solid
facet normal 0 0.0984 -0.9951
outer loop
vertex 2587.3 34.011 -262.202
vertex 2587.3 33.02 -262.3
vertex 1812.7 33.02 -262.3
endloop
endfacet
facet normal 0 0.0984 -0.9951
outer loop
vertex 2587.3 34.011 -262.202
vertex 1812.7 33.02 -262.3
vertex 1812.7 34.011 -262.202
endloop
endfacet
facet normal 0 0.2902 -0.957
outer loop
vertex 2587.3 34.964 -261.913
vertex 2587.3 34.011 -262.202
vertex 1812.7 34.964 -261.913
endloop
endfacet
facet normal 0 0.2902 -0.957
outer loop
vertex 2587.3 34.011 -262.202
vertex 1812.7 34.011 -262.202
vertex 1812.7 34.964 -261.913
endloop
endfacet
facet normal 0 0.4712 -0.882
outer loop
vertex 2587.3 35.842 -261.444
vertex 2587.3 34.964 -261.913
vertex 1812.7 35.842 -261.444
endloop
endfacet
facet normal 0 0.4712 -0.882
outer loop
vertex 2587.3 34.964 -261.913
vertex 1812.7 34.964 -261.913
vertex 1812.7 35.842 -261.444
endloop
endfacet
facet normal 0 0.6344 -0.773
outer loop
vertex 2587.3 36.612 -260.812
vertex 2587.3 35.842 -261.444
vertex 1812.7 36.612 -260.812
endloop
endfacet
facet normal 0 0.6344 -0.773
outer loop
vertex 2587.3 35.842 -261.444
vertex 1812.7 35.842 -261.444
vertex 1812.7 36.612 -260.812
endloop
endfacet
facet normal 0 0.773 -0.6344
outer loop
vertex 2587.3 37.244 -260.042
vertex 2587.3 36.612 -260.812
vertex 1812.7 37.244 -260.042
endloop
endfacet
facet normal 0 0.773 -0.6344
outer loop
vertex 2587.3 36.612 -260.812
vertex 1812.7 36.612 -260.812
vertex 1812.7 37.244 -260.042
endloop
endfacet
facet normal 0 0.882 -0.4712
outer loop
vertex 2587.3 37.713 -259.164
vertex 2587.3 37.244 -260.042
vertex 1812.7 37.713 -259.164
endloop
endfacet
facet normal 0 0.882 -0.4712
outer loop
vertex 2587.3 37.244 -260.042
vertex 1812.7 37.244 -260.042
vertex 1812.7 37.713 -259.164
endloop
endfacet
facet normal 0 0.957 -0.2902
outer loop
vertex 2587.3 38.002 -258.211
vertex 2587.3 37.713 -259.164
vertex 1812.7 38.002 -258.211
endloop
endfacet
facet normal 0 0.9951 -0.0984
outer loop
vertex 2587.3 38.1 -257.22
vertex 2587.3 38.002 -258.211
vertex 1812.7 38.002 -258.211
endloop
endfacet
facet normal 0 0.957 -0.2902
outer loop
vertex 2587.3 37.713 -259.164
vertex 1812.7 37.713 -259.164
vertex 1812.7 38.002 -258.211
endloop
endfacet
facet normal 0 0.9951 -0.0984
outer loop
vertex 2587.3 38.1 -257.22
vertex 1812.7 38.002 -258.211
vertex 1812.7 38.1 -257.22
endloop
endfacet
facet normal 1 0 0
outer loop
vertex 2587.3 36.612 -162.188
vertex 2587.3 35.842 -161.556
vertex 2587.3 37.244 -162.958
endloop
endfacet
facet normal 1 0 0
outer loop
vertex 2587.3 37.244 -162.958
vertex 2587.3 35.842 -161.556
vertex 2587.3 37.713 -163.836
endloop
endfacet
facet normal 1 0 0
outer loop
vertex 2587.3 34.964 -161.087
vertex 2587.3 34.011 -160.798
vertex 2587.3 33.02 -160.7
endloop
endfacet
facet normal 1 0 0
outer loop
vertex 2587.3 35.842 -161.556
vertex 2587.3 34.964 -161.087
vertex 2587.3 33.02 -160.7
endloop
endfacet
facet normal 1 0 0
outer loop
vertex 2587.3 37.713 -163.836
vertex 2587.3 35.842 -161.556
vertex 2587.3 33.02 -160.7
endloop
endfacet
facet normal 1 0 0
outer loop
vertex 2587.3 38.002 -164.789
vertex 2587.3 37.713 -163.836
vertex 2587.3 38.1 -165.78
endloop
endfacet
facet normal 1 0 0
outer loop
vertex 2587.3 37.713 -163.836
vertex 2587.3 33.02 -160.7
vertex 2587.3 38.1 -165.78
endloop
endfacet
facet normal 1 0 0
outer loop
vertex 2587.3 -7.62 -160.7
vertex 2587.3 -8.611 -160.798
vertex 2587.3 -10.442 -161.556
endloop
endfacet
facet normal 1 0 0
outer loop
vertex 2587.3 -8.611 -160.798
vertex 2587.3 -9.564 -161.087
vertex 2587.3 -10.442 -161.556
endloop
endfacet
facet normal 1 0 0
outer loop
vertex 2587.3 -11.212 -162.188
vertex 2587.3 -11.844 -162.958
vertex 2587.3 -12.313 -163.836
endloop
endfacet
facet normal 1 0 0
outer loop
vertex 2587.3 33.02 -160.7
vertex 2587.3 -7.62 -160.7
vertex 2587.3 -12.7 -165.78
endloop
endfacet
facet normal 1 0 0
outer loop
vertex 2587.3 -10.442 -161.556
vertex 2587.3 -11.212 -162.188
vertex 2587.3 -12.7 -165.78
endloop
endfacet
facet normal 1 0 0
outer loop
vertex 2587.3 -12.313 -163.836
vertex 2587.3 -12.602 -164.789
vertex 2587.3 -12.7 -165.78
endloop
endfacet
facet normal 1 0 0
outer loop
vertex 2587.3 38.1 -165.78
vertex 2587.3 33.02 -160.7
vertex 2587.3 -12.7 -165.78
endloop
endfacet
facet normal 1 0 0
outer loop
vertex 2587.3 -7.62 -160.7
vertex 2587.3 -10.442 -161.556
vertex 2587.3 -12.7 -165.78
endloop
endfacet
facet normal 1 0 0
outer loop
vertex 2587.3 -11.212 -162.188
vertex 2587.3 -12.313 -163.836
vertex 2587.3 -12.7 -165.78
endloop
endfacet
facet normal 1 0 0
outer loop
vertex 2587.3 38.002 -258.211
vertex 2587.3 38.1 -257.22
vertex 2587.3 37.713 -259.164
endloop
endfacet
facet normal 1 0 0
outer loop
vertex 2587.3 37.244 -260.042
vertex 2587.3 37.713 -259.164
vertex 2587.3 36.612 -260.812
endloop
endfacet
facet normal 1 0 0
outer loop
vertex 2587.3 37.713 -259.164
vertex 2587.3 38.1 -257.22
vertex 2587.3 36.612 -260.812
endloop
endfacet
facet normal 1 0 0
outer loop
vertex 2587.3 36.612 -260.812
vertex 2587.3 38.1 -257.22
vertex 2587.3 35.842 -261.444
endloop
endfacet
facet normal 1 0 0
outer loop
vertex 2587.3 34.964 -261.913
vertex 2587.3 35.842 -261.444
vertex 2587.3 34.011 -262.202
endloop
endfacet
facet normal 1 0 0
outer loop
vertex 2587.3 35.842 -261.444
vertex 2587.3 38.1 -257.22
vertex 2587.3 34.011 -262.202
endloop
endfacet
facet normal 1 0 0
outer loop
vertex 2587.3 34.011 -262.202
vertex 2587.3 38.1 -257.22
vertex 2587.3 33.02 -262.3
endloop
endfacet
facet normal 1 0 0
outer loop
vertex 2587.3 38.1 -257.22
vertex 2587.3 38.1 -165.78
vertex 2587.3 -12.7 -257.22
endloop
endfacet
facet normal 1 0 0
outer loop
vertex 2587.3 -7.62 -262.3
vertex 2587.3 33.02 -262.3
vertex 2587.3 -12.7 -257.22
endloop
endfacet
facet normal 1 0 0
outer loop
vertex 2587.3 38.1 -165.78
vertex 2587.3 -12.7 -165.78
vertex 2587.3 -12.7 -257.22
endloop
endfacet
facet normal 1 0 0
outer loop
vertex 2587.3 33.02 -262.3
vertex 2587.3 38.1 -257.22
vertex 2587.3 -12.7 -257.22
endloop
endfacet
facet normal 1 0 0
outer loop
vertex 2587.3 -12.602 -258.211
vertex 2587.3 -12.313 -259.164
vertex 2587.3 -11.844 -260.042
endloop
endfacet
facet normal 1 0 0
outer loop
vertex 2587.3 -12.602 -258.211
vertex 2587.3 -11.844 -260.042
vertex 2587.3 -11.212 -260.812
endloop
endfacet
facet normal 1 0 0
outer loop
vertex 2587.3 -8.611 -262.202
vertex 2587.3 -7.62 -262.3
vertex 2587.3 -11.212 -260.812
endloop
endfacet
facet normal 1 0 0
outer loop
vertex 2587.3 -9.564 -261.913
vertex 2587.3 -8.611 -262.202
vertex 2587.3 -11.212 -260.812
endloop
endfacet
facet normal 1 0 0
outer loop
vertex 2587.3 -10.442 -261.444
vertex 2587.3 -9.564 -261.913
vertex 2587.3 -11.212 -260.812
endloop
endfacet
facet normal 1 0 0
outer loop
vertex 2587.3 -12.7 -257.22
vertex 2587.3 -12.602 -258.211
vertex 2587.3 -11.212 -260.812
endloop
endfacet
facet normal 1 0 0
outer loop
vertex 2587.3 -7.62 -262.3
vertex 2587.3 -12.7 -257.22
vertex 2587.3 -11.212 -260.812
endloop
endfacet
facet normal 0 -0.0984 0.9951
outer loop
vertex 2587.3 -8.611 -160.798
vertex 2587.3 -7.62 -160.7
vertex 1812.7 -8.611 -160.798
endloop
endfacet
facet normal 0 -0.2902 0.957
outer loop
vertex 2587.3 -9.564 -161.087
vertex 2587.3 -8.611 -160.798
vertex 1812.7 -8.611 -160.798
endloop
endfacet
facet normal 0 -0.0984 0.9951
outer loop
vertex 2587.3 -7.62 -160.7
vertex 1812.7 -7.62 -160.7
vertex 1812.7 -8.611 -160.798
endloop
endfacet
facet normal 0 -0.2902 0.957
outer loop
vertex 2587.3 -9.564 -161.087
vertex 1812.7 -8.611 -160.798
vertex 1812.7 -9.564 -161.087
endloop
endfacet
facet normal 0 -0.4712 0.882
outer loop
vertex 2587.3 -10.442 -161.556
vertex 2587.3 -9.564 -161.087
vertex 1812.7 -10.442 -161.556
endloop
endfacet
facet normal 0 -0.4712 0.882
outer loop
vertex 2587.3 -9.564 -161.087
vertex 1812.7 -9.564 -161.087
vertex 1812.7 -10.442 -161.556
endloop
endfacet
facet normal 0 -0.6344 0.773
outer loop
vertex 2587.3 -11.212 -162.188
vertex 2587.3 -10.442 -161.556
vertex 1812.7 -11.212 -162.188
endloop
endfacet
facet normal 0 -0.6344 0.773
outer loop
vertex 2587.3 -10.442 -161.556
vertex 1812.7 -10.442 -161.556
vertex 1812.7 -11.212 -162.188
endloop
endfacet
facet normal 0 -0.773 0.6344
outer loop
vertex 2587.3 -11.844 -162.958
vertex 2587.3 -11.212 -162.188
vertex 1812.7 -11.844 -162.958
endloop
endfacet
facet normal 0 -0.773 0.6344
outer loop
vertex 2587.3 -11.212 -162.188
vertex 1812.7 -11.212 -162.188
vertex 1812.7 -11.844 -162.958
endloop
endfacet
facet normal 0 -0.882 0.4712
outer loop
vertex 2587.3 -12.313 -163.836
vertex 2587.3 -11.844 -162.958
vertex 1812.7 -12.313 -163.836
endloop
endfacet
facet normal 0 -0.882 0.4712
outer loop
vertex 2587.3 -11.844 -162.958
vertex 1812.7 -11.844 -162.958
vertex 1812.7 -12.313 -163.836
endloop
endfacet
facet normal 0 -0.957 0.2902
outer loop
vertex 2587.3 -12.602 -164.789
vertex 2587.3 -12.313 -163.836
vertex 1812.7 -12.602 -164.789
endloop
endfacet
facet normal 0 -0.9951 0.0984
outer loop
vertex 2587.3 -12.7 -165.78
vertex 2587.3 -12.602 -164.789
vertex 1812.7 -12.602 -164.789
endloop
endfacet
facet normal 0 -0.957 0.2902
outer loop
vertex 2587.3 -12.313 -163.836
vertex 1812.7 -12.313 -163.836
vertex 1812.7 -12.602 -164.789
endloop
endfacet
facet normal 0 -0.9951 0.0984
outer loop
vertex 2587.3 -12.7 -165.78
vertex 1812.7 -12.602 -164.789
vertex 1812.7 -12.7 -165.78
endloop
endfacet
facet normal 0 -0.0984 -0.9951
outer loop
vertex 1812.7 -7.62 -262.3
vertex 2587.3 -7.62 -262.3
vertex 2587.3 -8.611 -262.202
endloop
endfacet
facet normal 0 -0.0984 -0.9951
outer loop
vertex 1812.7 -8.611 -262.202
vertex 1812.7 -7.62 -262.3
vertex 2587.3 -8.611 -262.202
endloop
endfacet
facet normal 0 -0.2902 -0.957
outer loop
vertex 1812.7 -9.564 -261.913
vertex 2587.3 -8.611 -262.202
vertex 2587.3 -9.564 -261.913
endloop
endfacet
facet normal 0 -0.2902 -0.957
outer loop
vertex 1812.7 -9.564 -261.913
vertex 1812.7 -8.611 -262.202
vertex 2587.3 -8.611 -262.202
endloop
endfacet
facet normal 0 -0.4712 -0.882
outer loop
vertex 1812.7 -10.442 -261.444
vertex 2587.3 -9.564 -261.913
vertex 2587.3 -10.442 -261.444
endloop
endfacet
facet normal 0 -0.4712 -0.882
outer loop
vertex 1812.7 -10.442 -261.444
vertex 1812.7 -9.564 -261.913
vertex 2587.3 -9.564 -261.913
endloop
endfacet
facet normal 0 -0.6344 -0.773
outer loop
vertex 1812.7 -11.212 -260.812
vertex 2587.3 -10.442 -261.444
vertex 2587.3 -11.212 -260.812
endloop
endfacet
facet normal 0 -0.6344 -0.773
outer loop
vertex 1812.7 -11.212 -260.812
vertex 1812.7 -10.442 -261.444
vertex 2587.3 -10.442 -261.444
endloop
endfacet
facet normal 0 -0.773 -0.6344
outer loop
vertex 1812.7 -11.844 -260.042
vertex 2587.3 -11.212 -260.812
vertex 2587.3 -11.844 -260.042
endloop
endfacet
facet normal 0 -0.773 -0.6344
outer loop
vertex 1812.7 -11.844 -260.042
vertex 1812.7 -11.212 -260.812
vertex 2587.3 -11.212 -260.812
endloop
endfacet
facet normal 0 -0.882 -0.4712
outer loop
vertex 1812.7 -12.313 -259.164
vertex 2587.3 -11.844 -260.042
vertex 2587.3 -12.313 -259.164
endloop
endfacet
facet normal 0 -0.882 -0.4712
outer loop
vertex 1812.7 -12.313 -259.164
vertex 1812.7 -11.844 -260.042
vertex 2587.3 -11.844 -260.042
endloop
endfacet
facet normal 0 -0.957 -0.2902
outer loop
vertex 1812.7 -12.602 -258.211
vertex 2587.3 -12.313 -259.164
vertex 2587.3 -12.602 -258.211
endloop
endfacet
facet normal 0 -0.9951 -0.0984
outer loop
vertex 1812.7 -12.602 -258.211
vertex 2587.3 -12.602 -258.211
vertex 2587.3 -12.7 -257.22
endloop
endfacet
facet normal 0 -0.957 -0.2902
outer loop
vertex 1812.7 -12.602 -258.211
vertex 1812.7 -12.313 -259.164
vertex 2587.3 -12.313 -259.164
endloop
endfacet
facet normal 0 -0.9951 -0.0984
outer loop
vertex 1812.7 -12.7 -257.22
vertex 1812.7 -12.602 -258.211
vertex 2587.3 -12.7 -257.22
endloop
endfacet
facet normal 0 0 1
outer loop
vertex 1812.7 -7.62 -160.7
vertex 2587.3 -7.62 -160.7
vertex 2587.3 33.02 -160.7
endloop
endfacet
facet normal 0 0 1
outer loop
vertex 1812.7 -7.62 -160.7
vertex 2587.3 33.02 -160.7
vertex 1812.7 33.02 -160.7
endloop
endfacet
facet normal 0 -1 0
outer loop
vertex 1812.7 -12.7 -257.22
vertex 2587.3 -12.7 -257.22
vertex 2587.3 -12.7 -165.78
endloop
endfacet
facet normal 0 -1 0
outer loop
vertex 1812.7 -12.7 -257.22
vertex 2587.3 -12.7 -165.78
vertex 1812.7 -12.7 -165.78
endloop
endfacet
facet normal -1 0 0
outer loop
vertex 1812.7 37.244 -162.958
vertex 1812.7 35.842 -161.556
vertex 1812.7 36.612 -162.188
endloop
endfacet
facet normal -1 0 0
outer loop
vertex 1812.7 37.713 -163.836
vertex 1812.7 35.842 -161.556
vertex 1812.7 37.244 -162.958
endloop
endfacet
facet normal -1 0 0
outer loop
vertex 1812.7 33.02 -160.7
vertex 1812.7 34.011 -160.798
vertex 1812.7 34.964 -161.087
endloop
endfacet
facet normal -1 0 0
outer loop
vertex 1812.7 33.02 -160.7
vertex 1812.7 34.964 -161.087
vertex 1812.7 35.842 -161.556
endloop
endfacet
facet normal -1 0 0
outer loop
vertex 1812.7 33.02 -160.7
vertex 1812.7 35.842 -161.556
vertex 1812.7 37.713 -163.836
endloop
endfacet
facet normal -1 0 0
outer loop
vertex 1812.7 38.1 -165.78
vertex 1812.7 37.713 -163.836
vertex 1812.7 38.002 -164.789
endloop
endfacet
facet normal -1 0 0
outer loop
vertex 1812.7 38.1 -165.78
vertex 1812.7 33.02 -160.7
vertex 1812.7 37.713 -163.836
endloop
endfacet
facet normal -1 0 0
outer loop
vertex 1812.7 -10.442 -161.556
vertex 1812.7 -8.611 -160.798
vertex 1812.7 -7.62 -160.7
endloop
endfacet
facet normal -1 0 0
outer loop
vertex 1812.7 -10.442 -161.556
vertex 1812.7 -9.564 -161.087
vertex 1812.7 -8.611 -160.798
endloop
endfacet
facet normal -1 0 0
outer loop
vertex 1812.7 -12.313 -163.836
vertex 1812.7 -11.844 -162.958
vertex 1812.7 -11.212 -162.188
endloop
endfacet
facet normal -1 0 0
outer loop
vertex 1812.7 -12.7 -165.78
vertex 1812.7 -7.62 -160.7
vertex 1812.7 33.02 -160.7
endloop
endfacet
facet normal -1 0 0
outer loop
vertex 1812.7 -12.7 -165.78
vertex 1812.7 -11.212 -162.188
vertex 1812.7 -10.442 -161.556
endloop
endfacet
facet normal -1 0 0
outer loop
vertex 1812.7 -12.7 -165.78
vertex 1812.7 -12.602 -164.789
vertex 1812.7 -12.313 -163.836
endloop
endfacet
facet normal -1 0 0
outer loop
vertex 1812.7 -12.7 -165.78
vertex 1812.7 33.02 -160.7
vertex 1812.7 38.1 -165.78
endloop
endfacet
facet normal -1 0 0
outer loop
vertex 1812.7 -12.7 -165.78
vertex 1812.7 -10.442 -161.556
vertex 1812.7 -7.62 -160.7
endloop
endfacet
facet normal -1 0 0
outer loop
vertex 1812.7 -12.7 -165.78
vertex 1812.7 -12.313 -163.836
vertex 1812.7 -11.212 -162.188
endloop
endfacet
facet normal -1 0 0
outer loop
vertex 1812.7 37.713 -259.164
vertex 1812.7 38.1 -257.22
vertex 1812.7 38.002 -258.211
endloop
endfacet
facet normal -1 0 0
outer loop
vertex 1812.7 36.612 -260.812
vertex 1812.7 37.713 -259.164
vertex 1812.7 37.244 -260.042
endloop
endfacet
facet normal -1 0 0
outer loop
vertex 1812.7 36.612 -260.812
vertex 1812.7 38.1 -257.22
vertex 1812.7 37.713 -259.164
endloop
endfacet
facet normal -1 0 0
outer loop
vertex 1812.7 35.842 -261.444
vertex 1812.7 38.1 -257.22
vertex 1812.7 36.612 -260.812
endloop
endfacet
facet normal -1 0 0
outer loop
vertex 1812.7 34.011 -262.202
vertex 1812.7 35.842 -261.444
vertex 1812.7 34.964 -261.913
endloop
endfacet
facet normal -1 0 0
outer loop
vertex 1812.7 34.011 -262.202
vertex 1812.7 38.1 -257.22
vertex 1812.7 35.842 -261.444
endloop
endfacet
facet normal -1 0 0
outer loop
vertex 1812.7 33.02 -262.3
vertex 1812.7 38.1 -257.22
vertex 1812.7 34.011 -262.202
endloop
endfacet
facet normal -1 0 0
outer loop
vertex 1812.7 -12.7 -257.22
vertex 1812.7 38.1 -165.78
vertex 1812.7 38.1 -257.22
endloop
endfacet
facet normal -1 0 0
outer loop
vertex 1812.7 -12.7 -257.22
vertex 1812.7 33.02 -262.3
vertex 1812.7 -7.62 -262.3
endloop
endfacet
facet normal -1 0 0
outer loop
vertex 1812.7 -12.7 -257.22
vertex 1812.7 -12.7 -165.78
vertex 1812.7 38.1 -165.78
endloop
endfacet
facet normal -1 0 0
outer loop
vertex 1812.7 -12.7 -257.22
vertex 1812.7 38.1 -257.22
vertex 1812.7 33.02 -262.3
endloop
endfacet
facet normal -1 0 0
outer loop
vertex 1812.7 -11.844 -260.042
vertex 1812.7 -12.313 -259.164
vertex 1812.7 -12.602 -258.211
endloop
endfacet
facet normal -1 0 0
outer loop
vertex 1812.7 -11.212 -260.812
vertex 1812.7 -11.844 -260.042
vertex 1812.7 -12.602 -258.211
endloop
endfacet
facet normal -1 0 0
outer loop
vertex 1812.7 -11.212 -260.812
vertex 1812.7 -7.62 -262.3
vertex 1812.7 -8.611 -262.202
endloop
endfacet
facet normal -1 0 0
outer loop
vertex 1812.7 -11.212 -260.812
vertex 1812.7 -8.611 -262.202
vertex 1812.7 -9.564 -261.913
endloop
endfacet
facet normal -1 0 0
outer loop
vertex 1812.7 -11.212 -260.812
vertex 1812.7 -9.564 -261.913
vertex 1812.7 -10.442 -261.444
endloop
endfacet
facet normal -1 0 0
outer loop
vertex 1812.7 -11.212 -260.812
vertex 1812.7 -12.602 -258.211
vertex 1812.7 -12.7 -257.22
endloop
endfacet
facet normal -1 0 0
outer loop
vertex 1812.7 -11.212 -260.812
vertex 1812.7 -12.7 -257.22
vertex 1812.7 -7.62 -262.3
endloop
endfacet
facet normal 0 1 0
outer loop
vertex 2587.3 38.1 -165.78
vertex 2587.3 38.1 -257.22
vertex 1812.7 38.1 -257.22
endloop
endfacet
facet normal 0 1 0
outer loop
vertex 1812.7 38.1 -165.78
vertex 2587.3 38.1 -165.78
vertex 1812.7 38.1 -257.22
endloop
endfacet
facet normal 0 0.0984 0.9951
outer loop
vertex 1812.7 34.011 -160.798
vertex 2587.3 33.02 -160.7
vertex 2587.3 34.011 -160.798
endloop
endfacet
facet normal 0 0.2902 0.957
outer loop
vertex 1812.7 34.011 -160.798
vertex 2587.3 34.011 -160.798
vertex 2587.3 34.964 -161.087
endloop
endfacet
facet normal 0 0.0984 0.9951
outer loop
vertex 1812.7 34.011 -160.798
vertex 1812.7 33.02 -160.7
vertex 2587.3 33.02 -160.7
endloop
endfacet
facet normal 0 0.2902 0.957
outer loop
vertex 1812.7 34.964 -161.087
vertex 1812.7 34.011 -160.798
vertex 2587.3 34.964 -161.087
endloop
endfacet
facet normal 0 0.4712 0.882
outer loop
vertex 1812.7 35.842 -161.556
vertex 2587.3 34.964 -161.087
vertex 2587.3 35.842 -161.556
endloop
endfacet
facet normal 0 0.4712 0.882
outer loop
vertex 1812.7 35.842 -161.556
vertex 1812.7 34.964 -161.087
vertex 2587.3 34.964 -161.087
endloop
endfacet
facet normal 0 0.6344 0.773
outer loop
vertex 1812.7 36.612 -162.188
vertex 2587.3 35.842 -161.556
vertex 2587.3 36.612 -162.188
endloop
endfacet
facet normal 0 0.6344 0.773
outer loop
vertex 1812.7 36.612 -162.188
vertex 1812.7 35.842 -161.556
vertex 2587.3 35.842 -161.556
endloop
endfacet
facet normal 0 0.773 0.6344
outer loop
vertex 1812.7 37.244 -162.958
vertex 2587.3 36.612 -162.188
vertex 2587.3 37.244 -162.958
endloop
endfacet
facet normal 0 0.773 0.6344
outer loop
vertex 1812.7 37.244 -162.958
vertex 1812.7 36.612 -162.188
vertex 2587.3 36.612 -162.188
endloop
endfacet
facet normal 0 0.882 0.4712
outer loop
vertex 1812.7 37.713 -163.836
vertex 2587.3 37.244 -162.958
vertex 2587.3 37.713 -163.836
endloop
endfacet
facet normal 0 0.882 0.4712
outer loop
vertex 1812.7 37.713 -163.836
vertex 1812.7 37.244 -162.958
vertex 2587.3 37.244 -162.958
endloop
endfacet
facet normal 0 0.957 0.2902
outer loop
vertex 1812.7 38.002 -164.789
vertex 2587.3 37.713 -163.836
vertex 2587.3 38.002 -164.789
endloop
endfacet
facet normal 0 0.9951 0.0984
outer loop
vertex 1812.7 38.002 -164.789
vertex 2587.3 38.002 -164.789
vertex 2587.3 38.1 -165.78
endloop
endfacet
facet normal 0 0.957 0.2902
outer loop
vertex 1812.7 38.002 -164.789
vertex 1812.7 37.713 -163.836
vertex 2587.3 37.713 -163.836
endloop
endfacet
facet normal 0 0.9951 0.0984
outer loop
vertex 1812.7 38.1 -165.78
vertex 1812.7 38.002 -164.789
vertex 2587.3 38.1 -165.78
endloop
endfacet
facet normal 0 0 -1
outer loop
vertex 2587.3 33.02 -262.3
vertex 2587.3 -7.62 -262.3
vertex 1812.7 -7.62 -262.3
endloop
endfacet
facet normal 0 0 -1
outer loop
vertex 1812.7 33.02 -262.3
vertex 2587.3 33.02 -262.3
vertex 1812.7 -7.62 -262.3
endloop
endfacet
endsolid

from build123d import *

# Parameters (mm, degrees)
SKETCH1_W           = 774.6
SKETCH1_H           = 101.6
BOSS_EXTRUDE1_DEPTH = 50.8
FILLET1_R           = 5.08


with BuildPart() as part:
    # Sketch1 → Boss-Extrude1 (new body)
    with BuildSketch(Plane(origin=(0, -12.7, 0), x_dir=(-1, 0, 0), z_dir=(0, -1, 0))):
        with Locations((-2200, 211.5)):
            Rectangle(SKETCH1_W, SKETCH1_H)
    extrude(amount=-BOSS_EXTRUDE1_DEPTH)

    # Fillet1
    fillet1_edges = [part.edges().sort_by_distance(p)[0] for p in [
        (2200, 38.1, -262.3),
        (2200, -12.7, -262.3),
        (2200, -12.7, -160.7),
        (2200, 38.1, -160.7),
    ]]
    fillet(fillet1_edges, radius=FILLET1_R)


solid = part.part
